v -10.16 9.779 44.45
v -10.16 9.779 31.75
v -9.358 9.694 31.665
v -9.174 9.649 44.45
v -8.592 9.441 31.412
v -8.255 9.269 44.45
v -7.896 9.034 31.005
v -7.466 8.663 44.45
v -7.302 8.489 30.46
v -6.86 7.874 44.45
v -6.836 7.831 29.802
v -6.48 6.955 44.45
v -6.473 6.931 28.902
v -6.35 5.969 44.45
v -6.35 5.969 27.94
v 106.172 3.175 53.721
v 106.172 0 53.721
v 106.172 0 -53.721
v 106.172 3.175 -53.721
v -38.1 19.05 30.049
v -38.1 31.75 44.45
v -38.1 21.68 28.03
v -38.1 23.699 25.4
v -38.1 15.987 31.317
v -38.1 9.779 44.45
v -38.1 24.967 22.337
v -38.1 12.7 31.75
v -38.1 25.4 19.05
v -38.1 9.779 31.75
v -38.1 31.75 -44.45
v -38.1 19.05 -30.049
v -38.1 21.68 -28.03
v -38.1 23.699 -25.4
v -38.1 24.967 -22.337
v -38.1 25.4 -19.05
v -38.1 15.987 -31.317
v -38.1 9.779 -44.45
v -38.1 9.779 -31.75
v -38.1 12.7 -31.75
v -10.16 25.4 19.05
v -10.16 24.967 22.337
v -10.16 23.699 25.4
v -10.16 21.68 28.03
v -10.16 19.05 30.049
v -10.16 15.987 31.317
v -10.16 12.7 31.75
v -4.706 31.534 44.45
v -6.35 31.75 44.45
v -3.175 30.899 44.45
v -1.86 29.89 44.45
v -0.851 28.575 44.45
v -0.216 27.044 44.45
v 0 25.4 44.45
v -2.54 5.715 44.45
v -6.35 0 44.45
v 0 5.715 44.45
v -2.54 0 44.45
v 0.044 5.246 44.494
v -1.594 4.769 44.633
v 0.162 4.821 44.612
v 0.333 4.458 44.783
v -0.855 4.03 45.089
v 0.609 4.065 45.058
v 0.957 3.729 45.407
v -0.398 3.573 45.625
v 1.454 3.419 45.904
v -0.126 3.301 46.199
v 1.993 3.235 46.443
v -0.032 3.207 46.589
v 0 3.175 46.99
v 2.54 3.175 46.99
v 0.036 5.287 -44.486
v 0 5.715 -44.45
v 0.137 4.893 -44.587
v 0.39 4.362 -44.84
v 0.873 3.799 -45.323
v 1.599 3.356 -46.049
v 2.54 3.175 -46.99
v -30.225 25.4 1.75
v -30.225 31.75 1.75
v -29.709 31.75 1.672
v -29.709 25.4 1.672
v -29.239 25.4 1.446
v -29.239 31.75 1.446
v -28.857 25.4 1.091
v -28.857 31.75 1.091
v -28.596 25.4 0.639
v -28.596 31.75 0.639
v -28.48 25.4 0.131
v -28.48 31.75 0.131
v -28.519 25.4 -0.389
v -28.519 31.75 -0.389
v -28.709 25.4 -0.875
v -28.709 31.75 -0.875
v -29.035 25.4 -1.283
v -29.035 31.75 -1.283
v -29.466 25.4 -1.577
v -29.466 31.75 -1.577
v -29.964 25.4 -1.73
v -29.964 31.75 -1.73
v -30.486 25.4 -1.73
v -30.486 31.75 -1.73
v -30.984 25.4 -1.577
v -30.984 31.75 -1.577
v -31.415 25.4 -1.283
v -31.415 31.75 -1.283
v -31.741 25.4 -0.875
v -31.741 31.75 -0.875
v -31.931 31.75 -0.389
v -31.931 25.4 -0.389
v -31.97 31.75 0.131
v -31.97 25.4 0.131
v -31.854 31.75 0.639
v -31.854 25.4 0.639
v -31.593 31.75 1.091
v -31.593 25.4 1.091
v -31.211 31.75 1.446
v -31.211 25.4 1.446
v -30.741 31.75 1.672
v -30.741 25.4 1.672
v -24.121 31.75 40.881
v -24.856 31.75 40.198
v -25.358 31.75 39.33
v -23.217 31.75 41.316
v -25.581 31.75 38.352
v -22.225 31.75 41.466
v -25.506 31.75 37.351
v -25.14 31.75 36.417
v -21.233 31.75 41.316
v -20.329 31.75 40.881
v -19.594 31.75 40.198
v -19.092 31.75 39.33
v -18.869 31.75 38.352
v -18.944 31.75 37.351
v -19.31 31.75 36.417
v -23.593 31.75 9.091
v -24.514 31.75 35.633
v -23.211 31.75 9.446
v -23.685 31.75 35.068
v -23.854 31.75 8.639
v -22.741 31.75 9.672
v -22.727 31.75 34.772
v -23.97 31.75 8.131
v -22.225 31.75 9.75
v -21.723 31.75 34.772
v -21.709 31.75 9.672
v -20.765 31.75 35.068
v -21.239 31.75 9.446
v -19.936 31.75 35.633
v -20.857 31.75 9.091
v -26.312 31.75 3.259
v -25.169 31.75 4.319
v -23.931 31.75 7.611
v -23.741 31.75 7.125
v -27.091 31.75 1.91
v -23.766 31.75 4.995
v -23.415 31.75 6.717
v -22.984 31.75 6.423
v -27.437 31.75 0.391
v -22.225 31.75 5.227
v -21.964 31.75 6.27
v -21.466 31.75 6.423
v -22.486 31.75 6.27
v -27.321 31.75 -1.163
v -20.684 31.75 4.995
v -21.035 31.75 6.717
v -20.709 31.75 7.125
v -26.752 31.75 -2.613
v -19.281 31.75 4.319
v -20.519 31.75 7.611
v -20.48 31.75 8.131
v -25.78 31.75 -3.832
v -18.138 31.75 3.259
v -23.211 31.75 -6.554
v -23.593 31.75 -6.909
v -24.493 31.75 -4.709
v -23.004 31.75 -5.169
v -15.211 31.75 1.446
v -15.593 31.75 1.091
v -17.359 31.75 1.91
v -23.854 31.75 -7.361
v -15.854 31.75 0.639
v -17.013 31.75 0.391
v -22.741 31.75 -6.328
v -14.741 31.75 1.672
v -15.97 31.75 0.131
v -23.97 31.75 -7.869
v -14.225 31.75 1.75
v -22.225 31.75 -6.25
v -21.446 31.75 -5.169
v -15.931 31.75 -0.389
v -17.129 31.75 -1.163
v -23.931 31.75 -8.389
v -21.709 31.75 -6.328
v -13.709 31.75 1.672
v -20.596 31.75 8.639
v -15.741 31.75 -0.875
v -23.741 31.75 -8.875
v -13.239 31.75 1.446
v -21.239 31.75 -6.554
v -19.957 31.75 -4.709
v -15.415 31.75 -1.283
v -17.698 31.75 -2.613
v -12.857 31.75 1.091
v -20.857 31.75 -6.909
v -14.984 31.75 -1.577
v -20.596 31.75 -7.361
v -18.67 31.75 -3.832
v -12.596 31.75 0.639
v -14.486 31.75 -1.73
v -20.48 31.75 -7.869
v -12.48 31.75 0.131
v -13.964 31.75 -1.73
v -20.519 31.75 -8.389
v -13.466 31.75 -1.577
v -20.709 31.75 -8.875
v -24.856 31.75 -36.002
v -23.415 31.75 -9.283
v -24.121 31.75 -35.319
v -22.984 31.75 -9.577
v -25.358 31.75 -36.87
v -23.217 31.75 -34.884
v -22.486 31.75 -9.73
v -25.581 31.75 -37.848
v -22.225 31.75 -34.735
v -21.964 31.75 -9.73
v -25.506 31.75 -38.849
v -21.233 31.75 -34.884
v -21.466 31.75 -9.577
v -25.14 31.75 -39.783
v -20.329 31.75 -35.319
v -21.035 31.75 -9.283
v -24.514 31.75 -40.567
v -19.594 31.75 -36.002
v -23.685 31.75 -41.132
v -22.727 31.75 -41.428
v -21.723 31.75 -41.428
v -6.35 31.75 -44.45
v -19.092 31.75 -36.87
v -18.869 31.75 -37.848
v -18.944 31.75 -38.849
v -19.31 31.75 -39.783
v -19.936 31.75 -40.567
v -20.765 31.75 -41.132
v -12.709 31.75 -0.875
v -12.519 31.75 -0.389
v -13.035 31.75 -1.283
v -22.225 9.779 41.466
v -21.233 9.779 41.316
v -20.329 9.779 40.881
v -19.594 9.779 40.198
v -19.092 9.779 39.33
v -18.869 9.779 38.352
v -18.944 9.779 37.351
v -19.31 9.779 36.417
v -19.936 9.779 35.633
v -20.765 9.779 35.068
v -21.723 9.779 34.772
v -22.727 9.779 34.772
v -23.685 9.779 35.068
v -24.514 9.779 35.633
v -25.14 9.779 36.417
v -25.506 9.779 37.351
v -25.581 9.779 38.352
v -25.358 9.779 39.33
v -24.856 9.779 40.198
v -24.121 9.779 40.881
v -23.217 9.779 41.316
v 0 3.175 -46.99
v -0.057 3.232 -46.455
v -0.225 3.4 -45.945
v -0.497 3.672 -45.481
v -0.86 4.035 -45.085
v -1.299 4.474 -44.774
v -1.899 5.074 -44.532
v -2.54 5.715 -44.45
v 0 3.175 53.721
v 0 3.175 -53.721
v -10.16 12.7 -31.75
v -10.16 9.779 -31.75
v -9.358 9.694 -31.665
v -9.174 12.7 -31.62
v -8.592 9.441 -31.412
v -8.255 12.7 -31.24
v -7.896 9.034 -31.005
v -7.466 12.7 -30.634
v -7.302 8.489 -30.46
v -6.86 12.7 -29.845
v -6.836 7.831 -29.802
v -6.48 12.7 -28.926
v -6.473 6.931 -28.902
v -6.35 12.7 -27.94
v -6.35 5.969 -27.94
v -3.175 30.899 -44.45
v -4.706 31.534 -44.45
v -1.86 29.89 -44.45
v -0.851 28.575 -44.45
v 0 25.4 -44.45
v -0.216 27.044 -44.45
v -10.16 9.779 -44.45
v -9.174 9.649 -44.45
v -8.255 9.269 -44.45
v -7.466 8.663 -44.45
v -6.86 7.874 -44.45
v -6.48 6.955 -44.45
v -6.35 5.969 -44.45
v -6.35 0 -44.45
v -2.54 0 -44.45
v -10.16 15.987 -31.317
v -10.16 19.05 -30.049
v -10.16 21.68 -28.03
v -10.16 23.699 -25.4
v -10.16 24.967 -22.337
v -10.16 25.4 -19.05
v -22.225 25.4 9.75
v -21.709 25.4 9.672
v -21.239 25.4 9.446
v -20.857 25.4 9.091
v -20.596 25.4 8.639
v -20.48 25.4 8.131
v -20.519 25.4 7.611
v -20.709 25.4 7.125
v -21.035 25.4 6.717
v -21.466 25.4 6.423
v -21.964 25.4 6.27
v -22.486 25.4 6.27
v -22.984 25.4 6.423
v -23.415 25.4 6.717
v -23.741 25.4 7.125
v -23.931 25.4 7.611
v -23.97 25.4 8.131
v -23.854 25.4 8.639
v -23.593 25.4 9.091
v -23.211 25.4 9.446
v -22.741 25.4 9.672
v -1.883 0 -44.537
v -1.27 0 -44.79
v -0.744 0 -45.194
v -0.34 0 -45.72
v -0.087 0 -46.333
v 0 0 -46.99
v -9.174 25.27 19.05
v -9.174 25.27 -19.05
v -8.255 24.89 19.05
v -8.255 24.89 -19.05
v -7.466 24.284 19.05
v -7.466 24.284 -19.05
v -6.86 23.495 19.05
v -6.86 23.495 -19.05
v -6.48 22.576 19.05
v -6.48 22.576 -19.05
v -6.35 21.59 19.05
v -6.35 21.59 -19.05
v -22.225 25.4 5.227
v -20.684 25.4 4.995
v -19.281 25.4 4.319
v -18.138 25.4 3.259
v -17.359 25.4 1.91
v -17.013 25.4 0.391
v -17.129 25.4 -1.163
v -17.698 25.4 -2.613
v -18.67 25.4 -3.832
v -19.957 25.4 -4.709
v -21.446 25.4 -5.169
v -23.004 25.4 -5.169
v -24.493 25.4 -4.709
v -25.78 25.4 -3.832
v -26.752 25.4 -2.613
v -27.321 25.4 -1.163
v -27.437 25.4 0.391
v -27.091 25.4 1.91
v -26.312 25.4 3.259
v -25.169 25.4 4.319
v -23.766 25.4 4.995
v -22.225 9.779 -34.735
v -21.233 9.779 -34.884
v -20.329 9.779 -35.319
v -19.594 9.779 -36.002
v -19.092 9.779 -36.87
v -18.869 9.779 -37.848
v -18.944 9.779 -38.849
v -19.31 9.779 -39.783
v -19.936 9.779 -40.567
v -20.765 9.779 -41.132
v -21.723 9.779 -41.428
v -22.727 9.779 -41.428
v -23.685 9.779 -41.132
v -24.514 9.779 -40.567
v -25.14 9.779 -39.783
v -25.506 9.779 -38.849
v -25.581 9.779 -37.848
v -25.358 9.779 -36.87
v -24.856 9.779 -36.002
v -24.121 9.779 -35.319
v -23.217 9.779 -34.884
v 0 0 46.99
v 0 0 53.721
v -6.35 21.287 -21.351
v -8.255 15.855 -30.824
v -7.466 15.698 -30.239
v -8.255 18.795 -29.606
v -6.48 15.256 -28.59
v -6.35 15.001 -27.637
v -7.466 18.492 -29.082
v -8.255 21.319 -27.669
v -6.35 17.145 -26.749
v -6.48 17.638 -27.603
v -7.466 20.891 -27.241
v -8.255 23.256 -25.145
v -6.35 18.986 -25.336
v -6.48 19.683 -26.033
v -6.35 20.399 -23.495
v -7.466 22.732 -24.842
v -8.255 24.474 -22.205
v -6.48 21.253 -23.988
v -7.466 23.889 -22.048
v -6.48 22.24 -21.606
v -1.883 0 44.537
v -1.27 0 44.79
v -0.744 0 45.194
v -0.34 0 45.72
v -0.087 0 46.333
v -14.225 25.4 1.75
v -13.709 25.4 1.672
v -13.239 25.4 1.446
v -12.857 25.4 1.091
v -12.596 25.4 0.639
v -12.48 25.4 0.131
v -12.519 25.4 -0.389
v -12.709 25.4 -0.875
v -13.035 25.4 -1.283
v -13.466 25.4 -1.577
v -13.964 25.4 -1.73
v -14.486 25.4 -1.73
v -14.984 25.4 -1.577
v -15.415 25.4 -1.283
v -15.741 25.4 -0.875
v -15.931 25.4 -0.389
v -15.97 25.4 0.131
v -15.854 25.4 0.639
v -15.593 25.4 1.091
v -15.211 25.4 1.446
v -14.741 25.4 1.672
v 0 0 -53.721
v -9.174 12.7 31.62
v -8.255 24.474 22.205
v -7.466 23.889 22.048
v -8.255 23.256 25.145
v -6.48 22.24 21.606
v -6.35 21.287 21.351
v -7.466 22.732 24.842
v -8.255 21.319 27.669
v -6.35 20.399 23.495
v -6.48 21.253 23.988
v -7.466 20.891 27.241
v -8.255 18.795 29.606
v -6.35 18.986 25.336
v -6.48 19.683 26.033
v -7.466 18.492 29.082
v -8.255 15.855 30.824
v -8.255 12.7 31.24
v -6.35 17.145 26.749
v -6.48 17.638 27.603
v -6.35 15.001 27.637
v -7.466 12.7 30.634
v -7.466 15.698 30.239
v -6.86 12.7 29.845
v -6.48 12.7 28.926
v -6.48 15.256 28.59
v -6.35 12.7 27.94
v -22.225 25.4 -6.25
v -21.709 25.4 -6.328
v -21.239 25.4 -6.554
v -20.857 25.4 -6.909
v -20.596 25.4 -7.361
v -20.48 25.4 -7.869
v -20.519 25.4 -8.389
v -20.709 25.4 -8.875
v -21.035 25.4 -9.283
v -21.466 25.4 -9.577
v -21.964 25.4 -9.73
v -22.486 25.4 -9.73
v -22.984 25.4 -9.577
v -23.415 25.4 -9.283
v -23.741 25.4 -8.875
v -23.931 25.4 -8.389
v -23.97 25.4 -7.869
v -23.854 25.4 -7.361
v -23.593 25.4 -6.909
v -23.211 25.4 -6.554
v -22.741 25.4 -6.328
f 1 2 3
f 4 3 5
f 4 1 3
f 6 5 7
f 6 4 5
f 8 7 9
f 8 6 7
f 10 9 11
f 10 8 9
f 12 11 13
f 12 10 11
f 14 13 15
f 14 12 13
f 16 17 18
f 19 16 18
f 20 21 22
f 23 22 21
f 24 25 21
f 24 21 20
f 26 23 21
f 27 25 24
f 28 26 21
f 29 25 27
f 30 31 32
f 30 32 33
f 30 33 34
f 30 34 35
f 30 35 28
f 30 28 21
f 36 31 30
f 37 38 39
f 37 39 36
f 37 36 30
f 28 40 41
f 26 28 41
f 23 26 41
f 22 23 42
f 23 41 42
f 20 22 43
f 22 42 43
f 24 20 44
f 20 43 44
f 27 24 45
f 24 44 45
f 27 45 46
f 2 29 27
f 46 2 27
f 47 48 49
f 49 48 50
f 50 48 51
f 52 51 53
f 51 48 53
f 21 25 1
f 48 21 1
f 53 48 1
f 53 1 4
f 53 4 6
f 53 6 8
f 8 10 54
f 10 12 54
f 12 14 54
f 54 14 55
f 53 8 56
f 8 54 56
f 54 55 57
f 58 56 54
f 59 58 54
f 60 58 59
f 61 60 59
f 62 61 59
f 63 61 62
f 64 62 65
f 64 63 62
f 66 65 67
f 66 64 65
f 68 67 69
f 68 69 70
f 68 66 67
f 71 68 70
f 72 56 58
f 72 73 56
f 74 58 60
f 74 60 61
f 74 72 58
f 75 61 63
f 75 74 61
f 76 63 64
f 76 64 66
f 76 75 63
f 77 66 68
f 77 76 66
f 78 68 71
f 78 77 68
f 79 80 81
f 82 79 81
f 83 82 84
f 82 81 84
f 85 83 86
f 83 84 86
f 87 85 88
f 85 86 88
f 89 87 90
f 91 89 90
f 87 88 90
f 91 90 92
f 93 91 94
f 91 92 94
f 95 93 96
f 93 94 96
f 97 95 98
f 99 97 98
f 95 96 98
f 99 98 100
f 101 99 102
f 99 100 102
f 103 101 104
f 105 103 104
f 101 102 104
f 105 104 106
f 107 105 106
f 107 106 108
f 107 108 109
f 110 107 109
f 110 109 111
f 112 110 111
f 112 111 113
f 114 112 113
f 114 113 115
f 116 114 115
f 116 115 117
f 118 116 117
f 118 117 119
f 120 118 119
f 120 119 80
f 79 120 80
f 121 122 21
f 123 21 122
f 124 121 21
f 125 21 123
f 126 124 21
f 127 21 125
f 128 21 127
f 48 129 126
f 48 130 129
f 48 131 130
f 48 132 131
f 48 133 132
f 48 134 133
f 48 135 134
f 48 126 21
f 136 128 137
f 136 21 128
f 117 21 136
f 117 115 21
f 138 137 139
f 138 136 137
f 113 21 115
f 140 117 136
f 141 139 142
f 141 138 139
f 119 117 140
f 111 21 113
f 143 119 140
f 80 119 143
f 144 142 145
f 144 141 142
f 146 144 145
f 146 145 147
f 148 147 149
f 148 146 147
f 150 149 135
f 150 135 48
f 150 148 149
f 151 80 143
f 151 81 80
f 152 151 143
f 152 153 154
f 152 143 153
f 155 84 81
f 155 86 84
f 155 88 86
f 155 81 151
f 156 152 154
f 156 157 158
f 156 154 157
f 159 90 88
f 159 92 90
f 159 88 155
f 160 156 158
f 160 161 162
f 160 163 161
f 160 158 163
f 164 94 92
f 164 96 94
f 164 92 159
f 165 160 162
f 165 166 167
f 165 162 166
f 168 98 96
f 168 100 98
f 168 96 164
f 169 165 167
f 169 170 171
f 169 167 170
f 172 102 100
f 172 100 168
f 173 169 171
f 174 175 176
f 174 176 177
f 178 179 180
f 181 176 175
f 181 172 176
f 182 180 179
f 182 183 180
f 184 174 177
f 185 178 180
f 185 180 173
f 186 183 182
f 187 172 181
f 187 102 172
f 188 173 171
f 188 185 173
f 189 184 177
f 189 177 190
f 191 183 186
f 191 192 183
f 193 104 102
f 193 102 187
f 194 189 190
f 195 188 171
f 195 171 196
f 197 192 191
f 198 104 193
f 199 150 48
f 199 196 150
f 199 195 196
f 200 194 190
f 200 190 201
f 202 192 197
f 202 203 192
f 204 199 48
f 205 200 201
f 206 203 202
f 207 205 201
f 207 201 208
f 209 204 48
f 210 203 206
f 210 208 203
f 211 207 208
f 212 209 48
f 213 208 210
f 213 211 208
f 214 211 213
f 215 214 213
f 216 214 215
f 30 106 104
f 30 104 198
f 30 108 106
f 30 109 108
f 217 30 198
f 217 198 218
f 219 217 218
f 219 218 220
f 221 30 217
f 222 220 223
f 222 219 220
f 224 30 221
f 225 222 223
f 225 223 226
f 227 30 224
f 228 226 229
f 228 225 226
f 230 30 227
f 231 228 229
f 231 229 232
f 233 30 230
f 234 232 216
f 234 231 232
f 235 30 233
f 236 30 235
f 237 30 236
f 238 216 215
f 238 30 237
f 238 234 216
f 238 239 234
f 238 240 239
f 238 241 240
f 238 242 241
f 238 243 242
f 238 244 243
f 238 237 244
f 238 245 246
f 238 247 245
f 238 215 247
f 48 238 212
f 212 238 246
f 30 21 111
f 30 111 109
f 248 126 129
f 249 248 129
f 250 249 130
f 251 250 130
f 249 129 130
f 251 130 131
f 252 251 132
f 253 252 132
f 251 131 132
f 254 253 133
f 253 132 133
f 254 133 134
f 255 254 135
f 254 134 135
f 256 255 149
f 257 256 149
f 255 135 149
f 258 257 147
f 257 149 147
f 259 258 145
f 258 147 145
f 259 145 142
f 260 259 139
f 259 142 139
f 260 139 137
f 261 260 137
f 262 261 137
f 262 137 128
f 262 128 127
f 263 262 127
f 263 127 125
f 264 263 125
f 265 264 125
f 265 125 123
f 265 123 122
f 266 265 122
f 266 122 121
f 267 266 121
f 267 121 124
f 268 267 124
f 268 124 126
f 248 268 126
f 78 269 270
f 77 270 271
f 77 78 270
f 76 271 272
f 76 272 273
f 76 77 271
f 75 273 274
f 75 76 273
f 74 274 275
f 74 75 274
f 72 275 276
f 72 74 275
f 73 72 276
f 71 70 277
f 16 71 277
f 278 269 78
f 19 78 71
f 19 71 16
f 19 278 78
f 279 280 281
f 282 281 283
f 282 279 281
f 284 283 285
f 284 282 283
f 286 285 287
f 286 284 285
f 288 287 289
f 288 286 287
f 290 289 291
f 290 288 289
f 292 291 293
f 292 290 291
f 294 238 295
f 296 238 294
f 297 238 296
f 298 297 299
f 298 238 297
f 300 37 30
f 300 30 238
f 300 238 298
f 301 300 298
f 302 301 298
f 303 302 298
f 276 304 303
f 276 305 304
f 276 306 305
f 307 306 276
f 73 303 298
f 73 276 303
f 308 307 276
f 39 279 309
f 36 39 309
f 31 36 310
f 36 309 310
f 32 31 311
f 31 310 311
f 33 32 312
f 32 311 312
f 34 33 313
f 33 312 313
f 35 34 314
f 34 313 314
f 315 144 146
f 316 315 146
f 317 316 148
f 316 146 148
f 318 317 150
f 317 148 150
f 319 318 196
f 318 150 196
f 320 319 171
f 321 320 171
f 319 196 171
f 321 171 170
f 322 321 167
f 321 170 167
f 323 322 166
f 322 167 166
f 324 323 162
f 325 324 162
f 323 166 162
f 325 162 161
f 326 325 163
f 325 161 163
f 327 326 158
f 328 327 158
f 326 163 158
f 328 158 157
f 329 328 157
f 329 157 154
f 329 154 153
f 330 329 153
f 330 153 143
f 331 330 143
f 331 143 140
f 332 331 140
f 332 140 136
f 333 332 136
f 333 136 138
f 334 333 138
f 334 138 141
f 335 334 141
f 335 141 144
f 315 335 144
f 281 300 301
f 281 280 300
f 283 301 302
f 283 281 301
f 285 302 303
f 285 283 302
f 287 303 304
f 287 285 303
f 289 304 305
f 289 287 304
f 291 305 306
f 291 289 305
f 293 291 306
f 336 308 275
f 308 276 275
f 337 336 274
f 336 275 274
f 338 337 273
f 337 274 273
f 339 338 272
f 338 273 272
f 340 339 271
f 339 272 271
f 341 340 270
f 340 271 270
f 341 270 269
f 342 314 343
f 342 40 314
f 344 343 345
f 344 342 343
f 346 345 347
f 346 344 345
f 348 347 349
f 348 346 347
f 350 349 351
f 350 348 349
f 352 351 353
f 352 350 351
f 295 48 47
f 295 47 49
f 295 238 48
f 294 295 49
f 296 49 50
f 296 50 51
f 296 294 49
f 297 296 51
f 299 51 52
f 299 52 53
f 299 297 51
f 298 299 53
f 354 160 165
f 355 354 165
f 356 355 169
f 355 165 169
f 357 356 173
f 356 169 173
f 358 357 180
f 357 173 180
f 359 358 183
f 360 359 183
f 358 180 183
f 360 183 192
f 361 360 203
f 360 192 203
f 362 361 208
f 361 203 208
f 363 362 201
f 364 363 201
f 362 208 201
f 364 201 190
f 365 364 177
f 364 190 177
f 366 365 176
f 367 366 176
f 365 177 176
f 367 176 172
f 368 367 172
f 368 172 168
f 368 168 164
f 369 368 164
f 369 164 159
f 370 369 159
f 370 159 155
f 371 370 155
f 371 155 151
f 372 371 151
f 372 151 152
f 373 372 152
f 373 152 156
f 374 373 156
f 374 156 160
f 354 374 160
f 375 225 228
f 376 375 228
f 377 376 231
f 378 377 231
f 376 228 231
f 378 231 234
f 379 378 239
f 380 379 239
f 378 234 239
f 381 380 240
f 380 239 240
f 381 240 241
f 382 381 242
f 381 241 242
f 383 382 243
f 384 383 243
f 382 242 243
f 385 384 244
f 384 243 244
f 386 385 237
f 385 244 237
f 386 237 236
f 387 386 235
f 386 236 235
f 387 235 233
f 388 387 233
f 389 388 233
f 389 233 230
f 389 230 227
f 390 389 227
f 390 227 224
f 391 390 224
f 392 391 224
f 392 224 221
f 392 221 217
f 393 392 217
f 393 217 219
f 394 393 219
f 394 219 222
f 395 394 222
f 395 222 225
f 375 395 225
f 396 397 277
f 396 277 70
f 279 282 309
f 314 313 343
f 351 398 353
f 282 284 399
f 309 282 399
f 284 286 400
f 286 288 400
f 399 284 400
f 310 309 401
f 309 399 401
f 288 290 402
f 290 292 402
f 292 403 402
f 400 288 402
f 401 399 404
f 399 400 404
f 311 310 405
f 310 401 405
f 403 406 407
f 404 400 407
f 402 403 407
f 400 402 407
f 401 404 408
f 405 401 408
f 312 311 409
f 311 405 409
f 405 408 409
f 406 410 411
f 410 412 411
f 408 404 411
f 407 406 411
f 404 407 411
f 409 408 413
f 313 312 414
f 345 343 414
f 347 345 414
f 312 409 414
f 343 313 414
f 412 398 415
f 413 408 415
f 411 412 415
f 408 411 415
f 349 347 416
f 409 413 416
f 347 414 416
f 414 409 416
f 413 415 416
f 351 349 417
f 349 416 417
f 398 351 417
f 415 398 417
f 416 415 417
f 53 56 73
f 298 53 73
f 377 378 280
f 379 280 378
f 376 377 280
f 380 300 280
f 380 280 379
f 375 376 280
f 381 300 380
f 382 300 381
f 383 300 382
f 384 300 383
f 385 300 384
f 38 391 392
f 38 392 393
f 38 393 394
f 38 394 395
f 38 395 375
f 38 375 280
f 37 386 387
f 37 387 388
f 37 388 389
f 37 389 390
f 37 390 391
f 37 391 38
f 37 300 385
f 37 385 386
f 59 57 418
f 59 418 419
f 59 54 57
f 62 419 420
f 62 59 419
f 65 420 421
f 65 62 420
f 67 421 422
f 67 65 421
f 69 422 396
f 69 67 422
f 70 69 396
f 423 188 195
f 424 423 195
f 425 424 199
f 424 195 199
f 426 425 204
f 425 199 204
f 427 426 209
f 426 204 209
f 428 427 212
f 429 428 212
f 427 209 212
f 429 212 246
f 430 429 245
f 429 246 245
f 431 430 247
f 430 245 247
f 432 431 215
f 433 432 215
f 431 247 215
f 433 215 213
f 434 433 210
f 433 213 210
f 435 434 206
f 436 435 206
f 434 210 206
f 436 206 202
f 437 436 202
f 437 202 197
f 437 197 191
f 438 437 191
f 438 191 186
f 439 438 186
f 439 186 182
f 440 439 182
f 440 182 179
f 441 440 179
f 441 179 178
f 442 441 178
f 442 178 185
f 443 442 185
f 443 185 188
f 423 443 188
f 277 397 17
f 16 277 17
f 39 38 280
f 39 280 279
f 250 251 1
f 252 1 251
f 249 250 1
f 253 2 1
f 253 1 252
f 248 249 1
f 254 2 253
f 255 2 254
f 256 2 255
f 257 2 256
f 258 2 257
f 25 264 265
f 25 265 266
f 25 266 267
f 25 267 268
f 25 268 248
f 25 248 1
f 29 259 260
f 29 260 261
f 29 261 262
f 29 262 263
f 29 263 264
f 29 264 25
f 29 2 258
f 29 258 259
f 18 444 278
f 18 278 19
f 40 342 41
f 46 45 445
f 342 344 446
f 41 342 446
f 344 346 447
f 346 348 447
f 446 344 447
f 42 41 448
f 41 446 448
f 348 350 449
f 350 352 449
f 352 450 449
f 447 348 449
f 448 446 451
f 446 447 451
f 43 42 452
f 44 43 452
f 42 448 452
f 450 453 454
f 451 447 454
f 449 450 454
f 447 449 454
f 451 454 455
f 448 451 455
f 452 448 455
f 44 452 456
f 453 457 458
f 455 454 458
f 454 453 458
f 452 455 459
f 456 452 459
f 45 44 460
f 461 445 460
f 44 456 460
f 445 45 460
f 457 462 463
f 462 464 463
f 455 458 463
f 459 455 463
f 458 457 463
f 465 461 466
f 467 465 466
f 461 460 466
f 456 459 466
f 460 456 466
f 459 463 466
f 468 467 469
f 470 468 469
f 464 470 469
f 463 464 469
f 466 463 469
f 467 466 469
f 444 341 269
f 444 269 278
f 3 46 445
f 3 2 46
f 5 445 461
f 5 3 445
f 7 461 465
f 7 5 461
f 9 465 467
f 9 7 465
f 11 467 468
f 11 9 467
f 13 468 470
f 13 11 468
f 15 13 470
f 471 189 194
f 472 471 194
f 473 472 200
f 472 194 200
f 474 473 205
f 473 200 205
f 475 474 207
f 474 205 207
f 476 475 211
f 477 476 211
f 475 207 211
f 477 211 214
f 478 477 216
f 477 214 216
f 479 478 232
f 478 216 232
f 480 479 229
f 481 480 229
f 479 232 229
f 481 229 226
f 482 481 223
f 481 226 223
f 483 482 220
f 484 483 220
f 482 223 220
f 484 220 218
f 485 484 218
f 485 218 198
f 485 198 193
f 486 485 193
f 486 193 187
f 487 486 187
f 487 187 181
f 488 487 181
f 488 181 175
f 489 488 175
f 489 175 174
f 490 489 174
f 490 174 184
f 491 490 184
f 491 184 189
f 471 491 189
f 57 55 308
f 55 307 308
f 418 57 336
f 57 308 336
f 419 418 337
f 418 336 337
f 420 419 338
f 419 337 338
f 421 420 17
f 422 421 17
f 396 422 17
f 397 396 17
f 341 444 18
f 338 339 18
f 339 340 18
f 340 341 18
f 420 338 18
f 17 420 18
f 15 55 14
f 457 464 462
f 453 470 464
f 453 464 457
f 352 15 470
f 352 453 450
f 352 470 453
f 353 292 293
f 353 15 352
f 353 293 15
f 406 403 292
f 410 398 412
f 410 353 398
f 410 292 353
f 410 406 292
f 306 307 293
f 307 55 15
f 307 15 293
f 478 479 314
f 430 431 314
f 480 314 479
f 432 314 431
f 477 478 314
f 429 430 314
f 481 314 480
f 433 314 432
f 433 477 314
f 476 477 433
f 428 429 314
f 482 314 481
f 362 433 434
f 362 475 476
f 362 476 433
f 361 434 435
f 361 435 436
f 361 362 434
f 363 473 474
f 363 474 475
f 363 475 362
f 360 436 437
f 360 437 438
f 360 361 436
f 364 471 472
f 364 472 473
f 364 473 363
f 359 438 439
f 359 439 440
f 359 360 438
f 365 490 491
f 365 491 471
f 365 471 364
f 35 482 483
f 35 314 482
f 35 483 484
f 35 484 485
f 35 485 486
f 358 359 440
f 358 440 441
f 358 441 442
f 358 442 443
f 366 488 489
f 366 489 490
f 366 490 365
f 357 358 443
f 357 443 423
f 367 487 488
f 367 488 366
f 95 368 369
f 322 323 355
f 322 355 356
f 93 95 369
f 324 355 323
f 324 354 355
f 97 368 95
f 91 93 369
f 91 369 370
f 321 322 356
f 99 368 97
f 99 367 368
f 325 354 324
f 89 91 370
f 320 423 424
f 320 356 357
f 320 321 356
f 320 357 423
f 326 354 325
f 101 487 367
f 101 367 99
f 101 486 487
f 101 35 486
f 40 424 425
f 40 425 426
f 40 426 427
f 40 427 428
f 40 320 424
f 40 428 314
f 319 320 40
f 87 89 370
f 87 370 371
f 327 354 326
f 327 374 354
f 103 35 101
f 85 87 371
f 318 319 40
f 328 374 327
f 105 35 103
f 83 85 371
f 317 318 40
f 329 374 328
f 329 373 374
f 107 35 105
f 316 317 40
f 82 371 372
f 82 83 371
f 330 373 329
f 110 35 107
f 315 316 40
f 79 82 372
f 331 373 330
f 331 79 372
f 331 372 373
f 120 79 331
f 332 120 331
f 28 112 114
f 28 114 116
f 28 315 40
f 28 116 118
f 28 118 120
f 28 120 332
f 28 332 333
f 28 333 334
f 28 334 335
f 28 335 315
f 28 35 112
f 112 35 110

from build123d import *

# Parameters (mm, degrees)
SKETCH1_W           = 106.172
SKETCH1_H           = 107.442
BOSS_EXTRUDE1_DEPTH = 3.175
SKETCH13_W          = 38.1
SKETCH13_H          = 88.9
BOSS_EXTRUDE7_DEPTH = 31.75
SKETCH15_R          = 3.3655
SKETCH15_R_2        = 5.22699996
SKETCH15_R_3        = 1.750000056
CUT_EXTRUDE1_DEPTH  = 124.152352495
SKETCH17_W          = 63.5
SKETCH17_H          = 25.4
CUT_EXTRUDE2_DEPTH  = 31.75
SKETCH18_W          = 31.75
SKETCH18_H          = 9.779
CUT_EXTRUDE3_DEPTH  = 149.047631947
FILLET2_R           = 12.7
FILLET1_R           = 3.81
FILLET3_R           = 2.54
FILLET4_R           = 2.54
FILLET5_R           = 6.35


with BuildPart() as part:
    # Sketch1 → Boss-Extrude1 (new body)
    with BuildSketch(Plane(origin=(0, 0, 0), x_dir=(1, 0, 0), z_dir=(0, 1, 0))):
        with Locations((53.086, 0)):
            Rectangle(SKETCH1_W, SKETCH1_H)
    extrude(amount=BOSS_EXTRUDE1_DEPTH)

    # Sketch13 → Boss-Extrude7 (add)
    with BuildSketch(Plane(origin=(0, 0, 0), x_dir=(1, 0, 0), z_dir=(0, 1, 0))):
        with Locations((-19.05, 0)):
            Rectangle(SKETCH13_W, SKETCH13_H)
    extrude(amount=BOSS_EXTRUDE7_DEPTH)

    # Sketch15 → Cut-Extrude1 (cut, through all)
    with BuildSketch(Plane(origin=(0, 31.75, 0), x_dir=(1, 0, 0), z_dir=(0, 1, 0))):
        with Locations(Location((-22.225, 38.1, 0), (0, 0, 270))):
            Circle(SKETCH15_R)
        with Locations(Location((-22.225, -38.1, 0), (0, 0, 270))):
            Circle(SKETCH15_R)
        with Locations(Location((-22.225, 0, 0), (0, 0, 270))):
            Circle(SKETCH15_R_2)
        with Locations(Location((-14.224999998, 0, 0), (0, 0, 270))):
            Circle(SKETCH15_R_3)
        with Locations(Location((-22.225, -8.000000002, 0), (0, 0, 270))):
            Circle(SKETCH15_R_3)
        with Locations(Location((-30.225000002, 0, 0), (0, 0, 270))):
            Circle(SKETCH15_R_3)
        with Locations(Location((-22.225, 8.000000002, 0), (0, 0, 270))):
            Circle(SKETCH15_R_3)
    extrude(amount=-CUT_EXTRUDE1_DEPTH, mode=Mode.SUBTRACT)

    # Sketch17 → Cut-Extrude2 (cut)
    with BuildSketch(Plane.ZY.offset(38.1)):
        with Locations((0, 12.7)):
            Rectangle(SKETCH17_W, SKETCH17_H)
    extrude(amount=-CUT_EXTRUDE2_DEPTH, mode=Mode.SUBTRACT)

    # Sketch18 → Cut-Extrude3 (cut, through all)
    with BuildSketch(Plane(origin=(0, 0, -44.45), x_dir=(-1, 0, 0), z_dir=(0, 0, -1))):
        with Locations((22.225, 4.8895)):
            Rectangle(SKETCH18_W, SKETCH18_H)
    extrude(amount=-CUT_EXTRUDE3_DEPTH, mode=Mode.SUBTRACT)

    # Fillet2
    fillet2_edges = [part.edges().sort_by_distance(p)[0] for p in [
        (-22.225, 25.4, -31.75),
        (-22.225, 25.4, 31.75),
    ]]
    fillet(fillet2_edges, radius=FILLET2_R)

    # Fillet1
    fillet1_edges = [part.edges().sort_by_distance(p)[0] for p in [
        (-6.35, 9.779, 38.1),
        (-6.35, 9.779, -38.1),
        (-6.35, 25.4, 0),
        (-6.35, 11.2395, 31.75),
        (-6.35, 21.680256121, -28.030256121),
        (-6.35, 21.680256121, 28.030256121),
        (-6.35, 11.2395, -31.75),
    ]]
    fillet(fillet1_edges, radius=FILLET1_R)

    # Fillet3
    fillet3_edges = [part.edges().sort_by_distance(p)[0] for p in [
        (0, 3.175, 0),
    ]]
    fillet(fillet3_edges, radius=FILLET3_R)

    # Fillet4
    fillet4_edges = [part.edges().sort_by_distance(p)[0] for p in [
        (1.27, 3.175, 44.45),
        (1.27, 3.175, -44.45),
        (0, 1.5875, 44.45),
        (0, 1.5875, -44.45),
    ]]
    fillet(fillet4_edges, radius=FILLET4_R - 0.0001)  # a hair under: the kernel refuses the full size

    # Fillet5
    fillet5_edges = [part.edges().sort_by_distance(p)[0] for p in [
        (0, 31.75, 0),
    ]]
    fillet(fillet5_edges, radius=FILLET5_R)


solid = part.part
